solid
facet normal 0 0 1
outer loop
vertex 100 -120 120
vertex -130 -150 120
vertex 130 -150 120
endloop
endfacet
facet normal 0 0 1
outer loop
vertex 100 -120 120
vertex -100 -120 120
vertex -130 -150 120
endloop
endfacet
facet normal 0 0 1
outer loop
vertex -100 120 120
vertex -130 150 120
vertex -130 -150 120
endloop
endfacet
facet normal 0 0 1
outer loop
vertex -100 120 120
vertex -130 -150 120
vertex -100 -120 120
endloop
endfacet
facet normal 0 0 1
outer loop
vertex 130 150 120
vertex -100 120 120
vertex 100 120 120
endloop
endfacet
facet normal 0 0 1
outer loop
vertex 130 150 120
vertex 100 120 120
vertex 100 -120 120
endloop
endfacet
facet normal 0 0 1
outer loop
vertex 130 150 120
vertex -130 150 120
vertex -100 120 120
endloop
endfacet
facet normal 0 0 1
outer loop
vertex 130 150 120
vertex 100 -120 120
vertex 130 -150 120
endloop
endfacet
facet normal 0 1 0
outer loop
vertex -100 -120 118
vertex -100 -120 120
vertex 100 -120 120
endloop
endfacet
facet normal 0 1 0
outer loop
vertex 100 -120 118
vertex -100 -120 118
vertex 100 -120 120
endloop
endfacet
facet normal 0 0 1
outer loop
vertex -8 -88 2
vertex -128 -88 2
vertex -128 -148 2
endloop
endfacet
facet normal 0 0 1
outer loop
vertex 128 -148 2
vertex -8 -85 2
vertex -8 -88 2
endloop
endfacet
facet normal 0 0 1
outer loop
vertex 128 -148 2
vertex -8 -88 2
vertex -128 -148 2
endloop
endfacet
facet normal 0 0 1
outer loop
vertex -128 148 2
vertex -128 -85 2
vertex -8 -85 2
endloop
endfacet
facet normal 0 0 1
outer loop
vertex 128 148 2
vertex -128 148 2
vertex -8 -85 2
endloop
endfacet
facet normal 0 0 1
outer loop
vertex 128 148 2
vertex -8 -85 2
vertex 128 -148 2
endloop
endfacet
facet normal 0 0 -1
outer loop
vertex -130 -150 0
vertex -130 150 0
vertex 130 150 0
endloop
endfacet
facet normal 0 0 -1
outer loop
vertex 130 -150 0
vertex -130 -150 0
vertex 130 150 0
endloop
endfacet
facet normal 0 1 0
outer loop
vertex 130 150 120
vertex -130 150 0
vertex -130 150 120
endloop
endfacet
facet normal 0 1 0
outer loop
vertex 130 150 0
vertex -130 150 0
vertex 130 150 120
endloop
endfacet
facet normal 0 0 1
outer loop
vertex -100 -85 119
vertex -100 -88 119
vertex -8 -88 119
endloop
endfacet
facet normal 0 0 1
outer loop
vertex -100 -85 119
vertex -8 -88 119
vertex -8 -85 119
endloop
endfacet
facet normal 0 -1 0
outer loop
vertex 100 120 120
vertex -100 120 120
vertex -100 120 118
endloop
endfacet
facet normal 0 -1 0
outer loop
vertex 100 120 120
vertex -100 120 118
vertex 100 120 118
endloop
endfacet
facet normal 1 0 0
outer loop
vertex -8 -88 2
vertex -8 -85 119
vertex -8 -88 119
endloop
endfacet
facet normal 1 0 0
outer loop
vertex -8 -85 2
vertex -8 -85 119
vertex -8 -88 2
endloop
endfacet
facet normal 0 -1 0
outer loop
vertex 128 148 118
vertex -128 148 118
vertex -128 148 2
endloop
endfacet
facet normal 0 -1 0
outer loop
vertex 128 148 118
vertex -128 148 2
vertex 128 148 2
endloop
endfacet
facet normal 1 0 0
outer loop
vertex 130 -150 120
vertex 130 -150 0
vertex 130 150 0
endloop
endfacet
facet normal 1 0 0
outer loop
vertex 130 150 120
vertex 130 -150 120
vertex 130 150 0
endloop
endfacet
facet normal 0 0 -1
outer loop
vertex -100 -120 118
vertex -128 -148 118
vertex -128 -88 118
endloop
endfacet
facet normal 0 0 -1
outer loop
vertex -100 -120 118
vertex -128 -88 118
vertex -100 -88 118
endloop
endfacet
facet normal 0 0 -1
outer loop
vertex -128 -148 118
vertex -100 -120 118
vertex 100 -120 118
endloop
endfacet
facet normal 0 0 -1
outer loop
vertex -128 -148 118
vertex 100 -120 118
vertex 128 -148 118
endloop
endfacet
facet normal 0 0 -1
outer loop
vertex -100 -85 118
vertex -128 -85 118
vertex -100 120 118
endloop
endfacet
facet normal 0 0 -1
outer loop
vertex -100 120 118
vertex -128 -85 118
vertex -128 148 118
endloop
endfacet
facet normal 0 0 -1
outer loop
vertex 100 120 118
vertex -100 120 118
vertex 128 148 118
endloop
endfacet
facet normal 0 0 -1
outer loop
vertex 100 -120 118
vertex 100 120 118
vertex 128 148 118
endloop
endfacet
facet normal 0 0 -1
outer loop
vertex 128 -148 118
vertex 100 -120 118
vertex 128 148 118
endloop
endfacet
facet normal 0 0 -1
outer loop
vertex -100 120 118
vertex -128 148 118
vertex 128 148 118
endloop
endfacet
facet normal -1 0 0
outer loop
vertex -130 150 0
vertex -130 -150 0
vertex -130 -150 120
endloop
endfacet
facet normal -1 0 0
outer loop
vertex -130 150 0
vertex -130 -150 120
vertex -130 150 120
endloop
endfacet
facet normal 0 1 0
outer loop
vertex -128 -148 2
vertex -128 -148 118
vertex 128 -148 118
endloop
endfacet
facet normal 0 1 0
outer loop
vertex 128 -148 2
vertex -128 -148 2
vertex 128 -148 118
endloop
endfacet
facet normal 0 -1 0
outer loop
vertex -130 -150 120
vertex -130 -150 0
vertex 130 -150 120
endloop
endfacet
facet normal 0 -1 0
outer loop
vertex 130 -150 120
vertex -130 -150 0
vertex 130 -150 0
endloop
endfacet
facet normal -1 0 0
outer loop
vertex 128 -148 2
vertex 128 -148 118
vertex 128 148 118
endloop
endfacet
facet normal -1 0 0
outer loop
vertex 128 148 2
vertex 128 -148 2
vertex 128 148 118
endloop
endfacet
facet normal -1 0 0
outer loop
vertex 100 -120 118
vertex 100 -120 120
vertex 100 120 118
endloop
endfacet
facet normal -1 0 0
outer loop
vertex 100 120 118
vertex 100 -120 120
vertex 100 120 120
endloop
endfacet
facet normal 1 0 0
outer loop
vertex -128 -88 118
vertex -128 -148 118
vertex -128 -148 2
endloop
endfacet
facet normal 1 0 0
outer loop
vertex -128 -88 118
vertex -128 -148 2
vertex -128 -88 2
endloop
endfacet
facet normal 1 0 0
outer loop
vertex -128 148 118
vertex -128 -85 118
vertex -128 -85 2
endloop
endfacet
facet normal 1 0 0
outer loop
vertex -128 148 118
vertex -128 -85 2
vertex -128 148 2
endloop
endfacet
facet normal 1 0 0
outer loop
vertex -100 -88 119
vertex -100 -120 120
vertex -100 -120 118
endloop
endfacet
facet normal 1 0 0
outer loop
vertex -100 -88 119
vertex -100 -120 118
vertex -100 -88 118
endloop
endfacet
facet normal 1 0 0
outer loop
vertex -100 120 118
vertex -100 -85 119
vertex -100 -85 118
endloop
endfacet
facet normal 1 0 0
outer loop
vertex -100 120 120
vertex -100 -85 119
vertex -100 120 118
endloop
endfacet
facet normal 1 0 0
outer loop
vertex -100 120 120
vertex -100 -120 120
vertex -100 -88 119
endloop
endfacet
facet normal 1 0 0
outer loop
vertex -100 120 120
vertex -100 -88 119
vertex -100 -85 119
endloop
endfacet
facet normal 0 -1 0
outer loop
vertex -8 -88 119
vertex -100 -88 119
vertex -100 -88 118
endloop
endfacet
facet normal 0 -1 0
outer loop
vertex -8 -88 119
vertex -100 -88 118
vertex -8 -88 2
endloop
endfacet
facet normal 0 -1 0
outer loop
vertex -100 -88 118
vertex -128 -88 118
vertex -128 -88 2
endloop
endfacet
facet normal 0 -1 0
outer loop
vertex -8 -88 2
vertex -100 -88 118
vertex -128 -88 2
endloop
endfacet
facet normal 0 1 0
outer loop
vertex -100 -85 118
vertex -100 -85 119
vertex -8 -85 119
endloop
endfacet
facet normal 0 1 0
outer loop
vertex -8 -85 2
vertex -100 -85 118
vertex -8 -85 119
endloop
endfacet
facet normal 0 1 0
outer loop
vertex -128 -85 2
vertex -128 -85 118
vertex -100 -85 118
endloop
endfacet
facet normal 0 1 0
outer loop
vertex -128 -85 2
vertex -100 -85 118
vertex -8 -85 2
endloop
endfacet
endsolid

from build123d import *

# Parameters (mm, degrees)
CROQUIS2_W              = 260
CROQUIS2_H              = 300
SALIENTE_EXTRUIR1_DEPTH = 120
CROQUIS3_W              = 200
CROQUIS3_H              = 240
CORTAR_EXTRUIR2_DEPTH   = 2
CROQUIS4_W              = 256
CROQUIS4_H              = 296
CORTAR_EXTRUIR3_DEPTH   = 116
CROQUIS6_W              = 117
CROQUIS6_H              = 3
SALIENTE_EXTRUIR2_DEPTH = 120


with BuildPart() as part:
    # Croquis2 → Saliente-Extruir1 (new body)
    with BuildSketch(Plane.XY):
        Rectangle(CROQUIS2_W, CROQUIS2_H)
    extrude(amount=SALIENTE_EXTRUIR1_DEPTH)

    # Croquis3 → Cortar-Extruir2 (cut)
    with BuildSketch(Plane.XY.offset(120)):
        Rectangle(CROQUIS3_W, CROQUIS3_H)
    extrude(amount=-CORTAR_EXTRUIR2_DEPTH, mode=Mode.SUBTRACT)

    # Croquis4 → Cortar-Extruir3 (cut)
    with BuildSketch(Plane.XY.offset(118)):
        Rectangle(CROQUIS4_W, CROQUIS4_H)
    extrude(amount=-CORTAR_EXTRUIR3_DEPTH, mode=Mode.SUBTRACT)

    # Croquis6 → Saliente-Extruir2 (add)
    with BuildSketch(Plane(origin=(-128, 0, 0), x_dir=(0, 0, -1), z_dir=(1, 0, 0))):
        with Locations((-60.5, -86.5)):
            Rectangle(CROQUIS6_W, CROQUIS6_H)
    extrude(amount=SALIENTE_EXTRUIR2_DEPTH)


solid = part.part
